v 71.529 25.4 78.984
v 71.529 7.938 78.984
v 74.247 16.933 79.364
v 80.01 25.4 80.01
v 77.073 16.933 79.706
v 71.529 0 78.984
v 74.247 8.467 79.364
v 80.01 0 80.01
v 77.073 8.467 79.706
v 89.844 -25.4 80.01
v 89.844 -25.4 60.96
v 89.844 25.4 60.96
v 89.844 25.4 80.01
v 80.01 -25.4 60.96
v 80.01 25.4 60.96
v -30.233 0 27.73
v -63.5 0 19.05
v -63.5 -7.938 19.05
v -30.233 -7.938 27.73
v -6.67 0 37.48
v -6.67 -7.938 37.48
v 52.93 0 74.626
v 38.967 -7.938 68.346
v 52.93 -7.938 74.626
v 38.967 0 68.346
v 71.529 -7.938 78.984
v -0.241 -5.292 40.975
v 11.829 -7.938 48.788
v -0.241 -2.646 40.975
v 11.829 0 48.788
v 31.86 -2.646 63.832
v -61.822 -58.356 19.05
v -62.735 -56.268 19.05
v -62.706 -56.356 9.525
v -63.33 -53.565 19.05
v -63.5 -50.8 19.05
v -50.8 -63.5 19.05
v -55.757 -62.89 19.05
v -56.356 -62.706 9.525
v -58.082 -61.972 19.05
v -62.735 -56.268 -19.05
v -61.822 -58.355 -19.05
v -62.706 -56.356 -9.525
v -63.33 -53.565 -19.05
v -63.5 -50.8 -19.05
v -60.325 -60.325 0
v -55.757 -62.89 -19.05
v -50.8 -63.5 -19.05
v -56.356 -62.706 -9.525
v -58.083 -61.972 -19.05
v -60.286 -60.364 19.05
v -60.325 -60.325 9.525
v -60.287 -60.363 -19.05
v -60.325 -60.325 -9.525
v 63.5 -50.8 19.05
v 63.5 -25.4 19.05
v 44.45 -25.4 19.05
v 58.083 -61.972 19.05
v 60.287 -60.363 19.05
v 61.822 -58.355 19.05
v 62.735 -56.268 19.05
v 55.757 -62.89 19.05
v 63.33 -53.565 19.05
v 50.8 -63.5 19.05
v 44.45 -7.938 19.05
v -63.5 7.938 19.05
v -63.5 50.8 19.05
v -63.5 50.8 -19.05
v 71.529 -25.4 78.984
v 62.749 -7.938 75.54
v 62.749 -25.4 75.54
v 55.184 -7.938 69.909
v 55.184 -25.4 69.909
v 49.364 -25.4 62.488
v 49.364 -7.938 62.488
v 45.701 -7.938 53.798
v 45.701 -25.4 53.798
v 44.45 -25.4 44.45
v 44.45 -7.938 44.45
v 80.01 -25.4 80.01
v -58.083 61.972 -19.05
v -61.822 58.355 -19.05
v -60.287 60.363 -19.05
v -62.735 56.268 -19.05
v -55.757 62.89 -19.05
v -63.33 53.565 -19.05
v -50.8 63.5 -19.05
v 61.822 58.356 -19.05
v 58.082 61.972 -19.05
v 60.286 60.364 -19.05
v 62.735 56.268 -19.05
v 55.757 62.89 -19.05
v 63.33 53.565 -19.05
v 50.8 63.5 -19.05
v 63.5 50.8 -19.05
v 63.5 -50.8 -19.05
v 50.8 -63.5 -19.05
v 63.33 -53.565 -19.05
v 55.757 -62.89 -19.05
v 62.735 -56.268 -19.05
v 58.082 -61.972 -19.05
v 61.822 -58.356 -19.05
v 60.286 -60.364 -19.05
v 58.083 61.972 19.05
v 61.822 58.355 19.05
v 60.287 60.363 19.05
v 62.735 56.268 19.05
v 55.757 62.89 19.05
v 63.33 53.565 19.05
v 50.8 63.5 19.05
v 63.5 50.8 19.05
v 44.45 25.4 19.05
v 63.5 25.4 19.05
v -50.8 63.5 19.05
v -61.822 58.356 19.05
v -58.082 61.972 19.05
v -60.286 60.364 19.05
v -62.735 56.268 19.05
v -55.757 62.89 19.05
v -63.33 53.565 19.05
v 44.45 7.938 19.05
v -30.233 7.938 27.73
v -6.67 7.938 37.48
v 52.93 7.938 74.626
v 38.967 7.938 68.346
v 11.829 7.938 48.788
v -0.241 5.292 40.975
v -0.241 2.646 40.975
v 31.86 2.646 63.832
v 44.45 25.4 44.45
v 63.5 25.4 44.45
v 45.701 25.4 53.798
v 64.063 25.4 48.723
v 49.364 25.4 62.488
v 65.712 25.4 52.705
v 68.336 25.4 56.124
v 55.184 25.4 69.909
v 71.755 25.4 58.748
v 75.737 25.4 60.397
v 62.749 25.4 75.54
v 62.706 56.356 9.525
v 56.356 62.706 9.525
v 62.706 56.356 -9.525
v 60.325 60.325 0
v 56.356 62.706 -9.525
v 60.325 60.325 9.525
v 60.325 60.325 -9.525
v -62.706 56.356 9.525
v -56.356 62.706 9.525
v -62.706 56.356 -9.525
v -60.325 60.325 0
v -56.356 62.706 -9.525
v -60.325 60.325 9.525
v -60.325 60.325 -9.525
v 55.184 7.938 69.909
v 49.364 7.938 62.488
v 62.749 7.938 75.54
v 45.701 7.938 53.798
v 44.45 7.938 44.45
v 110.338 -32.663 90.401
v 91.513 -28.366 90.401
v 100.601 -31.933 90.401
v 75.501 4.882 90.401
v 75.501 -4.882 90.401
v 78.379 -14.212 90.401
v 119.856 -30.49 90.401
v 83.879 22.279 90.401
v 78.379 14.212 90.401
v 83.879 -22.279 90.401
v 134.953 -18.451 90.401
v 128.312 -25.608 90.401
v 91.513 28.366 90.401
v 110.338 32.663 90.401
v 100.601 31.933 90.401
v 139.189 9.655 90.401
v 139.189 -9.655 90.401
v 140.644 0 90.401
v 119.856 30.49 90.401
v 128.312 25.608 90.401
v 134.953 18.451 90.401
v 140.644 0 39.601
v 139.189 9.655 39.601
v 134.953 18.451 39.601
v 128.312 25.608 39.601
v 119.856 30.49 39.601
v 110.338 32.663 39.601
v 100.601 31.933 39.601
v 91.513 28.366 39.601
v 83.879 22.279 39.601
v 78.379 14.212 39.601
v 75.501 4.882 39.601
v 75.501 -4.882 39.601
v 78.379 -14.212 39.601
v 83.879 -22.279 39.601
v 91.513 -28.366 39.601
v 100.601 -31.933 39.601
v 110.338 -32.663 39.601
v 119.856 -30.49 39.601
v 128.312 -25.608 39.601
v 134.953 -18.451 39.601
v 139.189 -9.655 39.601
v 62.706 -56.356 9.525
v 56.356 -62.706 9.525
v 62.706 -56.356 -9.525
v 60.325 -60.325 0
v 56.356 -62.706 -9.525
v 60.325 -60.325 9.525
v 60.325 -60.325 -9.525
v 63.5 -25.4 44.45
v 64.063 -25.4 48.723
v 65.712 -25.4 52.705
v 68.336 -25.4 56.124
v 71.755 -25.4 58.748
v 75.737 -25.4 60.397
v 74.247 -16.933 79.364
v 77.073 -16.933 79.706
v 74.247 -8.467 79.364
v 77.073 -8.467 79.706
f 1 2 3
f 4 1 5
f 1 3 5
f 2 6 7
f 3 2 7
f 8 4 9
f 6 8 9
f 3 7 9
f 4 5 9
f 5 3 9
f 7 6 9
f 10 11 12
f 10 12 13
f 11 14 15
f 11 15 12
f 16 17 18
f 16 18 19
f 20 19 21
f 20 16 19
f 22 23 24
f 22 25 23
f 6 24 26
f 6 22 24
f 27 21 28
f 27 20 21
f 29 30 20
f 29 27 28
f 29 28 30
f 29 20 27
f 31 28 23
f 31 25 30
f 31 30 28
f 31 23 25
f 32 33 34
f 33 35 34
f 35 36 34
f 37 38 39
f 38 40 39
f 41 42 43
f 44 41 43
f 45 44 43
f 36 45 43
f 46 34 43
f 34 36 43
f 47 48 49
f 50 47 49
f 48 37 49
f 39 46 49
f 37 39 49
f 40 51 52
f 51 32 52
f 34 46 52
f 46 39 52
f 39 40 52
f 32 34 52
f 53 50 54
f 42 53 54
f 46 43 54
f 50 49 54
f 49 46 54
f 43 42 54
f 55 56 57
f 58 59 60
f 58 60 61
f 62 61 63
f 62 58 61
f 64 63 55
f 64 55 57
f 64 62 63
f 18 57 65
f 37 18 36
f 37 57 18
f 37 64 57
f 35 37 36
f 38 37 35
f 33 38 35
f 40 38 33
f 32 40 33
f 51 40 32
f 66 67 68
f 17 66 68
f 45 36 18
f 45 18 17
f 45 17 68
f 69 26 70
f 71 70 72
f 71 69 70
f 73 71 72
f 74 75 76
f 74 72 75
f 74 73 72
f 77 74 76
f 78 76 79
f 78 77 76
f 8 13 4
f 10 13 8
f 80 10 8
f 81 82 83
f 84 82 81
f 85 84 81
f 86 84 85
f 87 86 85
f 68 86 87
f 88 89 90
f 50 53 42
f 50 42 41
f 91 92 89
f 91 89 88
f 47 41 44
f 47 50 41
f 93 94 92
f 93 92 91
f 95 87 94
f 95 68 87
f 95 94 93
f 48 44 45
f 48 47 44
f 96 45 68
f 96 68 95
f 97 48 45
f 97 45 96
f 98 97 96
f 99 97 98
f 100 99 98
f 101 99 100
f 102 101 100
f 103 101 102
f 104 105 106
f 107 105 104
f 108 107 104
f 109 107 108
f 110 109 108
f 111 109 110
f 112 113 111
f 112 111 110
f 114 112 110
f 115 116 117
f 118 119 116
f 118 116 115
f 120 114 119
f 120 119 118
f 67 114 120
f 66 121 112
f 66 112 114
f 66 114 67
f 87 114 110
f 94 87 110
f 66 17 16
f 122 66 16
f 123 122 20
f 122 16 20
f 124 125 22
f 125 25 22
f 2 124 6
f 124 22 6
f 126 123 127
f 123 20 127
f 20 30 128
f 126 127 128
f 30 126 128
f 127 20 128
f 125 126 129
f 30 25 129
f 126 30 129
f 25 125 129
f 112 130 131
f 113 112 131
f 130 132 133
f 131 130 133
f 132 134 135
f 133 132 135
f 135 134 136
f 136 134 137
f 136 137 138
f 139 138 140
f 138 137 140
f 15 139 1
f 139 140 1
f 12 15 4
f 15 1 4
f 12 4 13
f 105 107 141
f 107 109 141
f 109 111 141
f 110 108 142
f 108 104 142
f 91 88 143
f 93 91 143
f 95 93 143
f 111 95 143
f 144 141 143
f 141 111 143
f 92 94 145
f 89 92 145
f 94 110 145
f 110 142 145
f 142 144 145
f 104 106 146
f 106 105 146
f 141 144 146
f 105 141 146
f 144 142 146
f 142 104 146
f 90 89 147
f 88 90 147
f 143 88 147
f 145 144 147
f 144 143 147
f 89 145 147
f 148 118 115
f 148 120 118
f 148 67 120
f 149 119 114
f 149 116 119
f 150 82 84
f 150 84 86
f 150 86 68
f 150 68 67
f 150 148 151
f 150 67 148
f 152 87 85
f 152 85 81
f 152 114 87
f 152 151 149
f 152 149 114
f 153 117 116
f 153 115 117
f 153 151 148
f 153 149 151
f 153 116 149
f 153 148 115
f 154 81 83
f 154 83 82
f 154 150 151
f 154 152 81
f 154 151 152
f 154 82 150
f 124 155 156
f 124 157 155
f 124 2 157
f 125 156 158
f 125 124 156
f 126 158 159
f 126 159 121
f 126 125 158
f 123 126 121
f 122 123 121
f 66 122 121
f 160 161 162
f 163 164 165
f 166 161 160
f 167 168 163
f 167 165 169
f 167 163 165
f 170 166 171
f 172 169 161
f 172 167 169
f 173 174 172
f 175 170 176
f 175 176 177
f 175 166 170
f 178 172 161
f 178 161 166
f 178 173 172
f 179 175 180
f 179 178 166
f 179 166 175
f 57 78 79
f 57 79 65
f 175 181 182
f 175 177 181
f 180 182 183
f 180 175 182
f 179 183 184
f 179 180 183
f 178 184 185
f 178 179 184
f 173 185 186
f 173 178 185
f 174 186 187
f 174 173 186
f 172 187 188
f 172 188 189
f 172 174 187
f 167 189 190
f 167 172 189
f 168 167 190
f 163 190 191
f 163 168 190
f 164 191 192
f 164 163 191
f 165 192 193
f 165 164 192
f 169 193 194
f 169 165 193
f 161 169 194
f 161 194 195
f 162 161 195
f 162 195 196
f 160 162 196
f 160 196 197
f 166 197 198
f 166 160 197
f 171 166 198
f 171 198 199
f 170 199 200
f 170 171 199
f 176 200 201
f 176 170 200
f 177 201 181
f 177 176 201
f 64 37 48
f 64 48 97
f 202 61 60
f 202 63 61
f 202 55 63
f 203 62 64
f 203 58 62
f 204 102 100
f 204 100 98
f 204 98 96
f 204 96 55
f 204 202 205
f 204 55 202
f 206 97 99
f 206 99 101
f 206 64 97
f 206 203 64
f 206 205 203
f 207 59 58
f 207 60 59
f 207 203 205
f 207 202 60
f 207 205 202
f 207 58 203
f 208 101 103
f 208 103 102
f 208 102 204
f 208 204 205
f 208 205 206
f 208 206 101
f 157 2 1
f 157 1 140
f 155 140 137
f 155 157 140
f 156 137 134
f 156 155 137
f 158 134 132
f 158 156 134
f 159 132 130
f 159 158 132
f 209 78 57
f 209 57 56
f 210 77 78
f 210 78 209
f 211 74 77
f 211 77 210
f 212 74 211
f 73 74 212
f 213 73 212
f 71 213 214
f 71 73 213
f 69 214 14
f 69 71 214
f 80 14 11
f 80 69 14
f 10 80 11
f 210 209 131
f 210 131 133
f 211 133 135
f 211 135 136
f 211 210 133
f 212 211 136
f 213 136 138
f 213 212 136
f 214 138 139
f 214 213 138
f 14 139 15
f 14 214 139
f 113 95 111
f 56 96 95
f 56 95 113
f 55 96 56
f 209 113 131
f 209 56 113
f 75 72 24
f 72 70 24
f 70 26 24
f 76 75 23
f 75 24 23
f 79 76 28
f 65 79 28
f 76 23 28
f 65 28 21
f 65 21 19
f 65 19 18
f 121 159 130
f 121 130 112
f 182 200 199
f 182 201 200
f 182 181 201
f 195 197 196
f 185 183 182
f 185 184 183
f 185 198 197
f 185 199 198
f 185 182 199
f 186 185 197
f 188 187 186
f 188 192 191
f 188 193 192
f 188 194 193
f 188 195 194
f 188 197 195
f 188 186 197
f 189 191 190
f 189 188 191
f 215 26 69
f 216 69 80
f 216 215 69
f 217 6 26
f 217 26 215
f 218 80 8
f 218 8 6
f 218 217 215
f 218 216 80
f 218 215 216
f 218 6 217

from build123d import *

# Parameters (mm, degrees)
F1_DEPTH    = 63.5
F2_DEPTH    = 25.4
F3_DEPTH    = 7.9375
F5_T1_DEPTH = 101.6


# Not quite as in the source:
# - a fillet or chamfer that OpenCascade refuses, or shapes differently, is made with other operations: its cross-section is extruded or revolved along the edge and cut away or added


with BuildPart() as f1:
    # F0 (on Front) → F1 (new body, symmetric)
    with BuildSketch(Plane.XZ):
        Polygon((44.45, 19.05), (-63.5, 19.05), (-63.5, -19.05), (63.5, -19.05), (63.5, 19.05), align=None)
    extrude(amount=F1_DEPTH, both=True)

    # F0 (on Front) → F2 (join, symmetric)
    with BuildSketch(Plane.XZ):
        with BuildLine():
            Line((44.45, 44.45), (44.45, 19.05))
            Line((44.45, 19.05), (63.5, 19.05))
            Line((63.5, 19.05), (63.5, 44.45))
            ThreePointArc((63.5, 44.45), (68.3356670426, 56.1243329574), (80.01, 60.96))
            Line((80.01, 60.96), (89.8442984975, 60.96))
            Line((89.8442984975, 60.96), (89.8442984975, 80.01))
            Line((89.8442984975, 80.01), (80.01, 80.01))
            add(Edge.make_bspline(
                [(71.5290560563, 78.9838557046), (74.194576587, 79.3820969631), (77.0154135084, 79.7255153509), (80.01, 80.01)],
                knots=[148.8797919707, 148.8797919707, 148.8797919707, 148.8797919707, 155.9206262815, 155.9206262815, 155.9206262815, 155.9206262815], degree=3))
            ThreePointArc((71.5290560563, 78.9838557046), (52.0270054619, 66.3923247784), (44.45, 44.45))
        make_face()
    extrude(amount=F2_DEPTH, both=True)

    # F0 (on Front) → F3 (join, symmetric)
    with BuildSketch(Plane.XZ):
        with BuildLine():
            add(Edge.make_bspline(
                [(-63.5, 19.05), (28.2481007656, 37.6297254633), (15.1661131725, 70.5629679071), (71.5290560563, 78.9838557046)],
                knots=[0, 0, 0, 0, 148.8797919707, 148.8797919707, 148.8797919707, 148.8797919707], degree=3))
            Line((-63.5, 19.05), (44.45, 19.05))
            Line((44.45, 19.05), (44.45, 44.45))
            ThreePointArc((44.45, 44.45), (52.0270054619, 66.3923247784), (71.5290560563, 78.9838557046))
        make_face()
    extrude(amount=F3_DEPTH, both=True)

    # F5: fillet of radius 12.7 on 4 edges, made by hand

    # F5_s2 → F5_t1 (cut)
    with BuildSketch(Plane.XY.offset(-50.8)):
        with BuildLine():
            add(Edge.make_bspline(
                [(-63.5, -50.8), (-63.5, -63.5), (-50.8, -63.5)],
                knots=[0, 0, 0, 1, 1, 1], degree=2, weights=[1, 1, 1]))
            Line((-50.8, -63.5), (-63.5, -63.5))
            Line((-63.5, -63.5), (-63.5, -50.8))
        make_face()
        with BuildLine():
            add(Edge.make_bspline(
                [(63.5, -50.8), (63.5, -63.5), (50.8, -63.5)],
                knots=[0, 0, 0, 1, 1, 1], degree=2, weights=[1, 1, 1]))
            Line((50.8, -63.5), (63.5, -63.5))
            Line((63.5, -63.5), (63.5, -50.8))
        make_face()
        with BuildLine():
            add(Edge.make_bspline(
                [(63.5, 50.8), (63.5, 63.5), (50.8, 63.5)],
                knots=[0, 0, 0, 1, 1, 1], degree=2, weights=[1, 1, 1]))
            Line((50.8, 63.5), (63.5, 63.5))
            Line((63.5, 63.5), (63.5, 50.8))
        make_face()
        with BuildLine():
            add(Edge.make_bspline(
                [(-63.5, 50.8), (-63.5, 63.5), (-50.8, 63.5)],
                knots=[0, 0, 0, 1, 1, 1], degree=2, weights=[1, 1, 1]))
            Line((-50.8, 63.5), (-63.5, 63.5))
            Line((-63.5, 63.5), (-63.5, 50.8))
        make_face()
    extrude(amount=F5_T1_DEPTH, mode=Mode.SUBTRACT)


with BuildPart() as f4:
    # F0 (on Front) → F4 (revolve)
    with BuildSketch(Plane.XZ):
        Polygon((107.8898191703, 90.4005332853), (107.8898191703, 80.01), (107.8898191703, 60.96), (107.8898191703, 39.6005332853), (140.6442984975, 39.6005332853), (140.6442984975, 90.4005332853), align=None)
    revolve(axis=Axis((107.8898191703, 0, 65.0005332853), (0, 0, 1)))


solid = Compound([f1.part, f4.part])
